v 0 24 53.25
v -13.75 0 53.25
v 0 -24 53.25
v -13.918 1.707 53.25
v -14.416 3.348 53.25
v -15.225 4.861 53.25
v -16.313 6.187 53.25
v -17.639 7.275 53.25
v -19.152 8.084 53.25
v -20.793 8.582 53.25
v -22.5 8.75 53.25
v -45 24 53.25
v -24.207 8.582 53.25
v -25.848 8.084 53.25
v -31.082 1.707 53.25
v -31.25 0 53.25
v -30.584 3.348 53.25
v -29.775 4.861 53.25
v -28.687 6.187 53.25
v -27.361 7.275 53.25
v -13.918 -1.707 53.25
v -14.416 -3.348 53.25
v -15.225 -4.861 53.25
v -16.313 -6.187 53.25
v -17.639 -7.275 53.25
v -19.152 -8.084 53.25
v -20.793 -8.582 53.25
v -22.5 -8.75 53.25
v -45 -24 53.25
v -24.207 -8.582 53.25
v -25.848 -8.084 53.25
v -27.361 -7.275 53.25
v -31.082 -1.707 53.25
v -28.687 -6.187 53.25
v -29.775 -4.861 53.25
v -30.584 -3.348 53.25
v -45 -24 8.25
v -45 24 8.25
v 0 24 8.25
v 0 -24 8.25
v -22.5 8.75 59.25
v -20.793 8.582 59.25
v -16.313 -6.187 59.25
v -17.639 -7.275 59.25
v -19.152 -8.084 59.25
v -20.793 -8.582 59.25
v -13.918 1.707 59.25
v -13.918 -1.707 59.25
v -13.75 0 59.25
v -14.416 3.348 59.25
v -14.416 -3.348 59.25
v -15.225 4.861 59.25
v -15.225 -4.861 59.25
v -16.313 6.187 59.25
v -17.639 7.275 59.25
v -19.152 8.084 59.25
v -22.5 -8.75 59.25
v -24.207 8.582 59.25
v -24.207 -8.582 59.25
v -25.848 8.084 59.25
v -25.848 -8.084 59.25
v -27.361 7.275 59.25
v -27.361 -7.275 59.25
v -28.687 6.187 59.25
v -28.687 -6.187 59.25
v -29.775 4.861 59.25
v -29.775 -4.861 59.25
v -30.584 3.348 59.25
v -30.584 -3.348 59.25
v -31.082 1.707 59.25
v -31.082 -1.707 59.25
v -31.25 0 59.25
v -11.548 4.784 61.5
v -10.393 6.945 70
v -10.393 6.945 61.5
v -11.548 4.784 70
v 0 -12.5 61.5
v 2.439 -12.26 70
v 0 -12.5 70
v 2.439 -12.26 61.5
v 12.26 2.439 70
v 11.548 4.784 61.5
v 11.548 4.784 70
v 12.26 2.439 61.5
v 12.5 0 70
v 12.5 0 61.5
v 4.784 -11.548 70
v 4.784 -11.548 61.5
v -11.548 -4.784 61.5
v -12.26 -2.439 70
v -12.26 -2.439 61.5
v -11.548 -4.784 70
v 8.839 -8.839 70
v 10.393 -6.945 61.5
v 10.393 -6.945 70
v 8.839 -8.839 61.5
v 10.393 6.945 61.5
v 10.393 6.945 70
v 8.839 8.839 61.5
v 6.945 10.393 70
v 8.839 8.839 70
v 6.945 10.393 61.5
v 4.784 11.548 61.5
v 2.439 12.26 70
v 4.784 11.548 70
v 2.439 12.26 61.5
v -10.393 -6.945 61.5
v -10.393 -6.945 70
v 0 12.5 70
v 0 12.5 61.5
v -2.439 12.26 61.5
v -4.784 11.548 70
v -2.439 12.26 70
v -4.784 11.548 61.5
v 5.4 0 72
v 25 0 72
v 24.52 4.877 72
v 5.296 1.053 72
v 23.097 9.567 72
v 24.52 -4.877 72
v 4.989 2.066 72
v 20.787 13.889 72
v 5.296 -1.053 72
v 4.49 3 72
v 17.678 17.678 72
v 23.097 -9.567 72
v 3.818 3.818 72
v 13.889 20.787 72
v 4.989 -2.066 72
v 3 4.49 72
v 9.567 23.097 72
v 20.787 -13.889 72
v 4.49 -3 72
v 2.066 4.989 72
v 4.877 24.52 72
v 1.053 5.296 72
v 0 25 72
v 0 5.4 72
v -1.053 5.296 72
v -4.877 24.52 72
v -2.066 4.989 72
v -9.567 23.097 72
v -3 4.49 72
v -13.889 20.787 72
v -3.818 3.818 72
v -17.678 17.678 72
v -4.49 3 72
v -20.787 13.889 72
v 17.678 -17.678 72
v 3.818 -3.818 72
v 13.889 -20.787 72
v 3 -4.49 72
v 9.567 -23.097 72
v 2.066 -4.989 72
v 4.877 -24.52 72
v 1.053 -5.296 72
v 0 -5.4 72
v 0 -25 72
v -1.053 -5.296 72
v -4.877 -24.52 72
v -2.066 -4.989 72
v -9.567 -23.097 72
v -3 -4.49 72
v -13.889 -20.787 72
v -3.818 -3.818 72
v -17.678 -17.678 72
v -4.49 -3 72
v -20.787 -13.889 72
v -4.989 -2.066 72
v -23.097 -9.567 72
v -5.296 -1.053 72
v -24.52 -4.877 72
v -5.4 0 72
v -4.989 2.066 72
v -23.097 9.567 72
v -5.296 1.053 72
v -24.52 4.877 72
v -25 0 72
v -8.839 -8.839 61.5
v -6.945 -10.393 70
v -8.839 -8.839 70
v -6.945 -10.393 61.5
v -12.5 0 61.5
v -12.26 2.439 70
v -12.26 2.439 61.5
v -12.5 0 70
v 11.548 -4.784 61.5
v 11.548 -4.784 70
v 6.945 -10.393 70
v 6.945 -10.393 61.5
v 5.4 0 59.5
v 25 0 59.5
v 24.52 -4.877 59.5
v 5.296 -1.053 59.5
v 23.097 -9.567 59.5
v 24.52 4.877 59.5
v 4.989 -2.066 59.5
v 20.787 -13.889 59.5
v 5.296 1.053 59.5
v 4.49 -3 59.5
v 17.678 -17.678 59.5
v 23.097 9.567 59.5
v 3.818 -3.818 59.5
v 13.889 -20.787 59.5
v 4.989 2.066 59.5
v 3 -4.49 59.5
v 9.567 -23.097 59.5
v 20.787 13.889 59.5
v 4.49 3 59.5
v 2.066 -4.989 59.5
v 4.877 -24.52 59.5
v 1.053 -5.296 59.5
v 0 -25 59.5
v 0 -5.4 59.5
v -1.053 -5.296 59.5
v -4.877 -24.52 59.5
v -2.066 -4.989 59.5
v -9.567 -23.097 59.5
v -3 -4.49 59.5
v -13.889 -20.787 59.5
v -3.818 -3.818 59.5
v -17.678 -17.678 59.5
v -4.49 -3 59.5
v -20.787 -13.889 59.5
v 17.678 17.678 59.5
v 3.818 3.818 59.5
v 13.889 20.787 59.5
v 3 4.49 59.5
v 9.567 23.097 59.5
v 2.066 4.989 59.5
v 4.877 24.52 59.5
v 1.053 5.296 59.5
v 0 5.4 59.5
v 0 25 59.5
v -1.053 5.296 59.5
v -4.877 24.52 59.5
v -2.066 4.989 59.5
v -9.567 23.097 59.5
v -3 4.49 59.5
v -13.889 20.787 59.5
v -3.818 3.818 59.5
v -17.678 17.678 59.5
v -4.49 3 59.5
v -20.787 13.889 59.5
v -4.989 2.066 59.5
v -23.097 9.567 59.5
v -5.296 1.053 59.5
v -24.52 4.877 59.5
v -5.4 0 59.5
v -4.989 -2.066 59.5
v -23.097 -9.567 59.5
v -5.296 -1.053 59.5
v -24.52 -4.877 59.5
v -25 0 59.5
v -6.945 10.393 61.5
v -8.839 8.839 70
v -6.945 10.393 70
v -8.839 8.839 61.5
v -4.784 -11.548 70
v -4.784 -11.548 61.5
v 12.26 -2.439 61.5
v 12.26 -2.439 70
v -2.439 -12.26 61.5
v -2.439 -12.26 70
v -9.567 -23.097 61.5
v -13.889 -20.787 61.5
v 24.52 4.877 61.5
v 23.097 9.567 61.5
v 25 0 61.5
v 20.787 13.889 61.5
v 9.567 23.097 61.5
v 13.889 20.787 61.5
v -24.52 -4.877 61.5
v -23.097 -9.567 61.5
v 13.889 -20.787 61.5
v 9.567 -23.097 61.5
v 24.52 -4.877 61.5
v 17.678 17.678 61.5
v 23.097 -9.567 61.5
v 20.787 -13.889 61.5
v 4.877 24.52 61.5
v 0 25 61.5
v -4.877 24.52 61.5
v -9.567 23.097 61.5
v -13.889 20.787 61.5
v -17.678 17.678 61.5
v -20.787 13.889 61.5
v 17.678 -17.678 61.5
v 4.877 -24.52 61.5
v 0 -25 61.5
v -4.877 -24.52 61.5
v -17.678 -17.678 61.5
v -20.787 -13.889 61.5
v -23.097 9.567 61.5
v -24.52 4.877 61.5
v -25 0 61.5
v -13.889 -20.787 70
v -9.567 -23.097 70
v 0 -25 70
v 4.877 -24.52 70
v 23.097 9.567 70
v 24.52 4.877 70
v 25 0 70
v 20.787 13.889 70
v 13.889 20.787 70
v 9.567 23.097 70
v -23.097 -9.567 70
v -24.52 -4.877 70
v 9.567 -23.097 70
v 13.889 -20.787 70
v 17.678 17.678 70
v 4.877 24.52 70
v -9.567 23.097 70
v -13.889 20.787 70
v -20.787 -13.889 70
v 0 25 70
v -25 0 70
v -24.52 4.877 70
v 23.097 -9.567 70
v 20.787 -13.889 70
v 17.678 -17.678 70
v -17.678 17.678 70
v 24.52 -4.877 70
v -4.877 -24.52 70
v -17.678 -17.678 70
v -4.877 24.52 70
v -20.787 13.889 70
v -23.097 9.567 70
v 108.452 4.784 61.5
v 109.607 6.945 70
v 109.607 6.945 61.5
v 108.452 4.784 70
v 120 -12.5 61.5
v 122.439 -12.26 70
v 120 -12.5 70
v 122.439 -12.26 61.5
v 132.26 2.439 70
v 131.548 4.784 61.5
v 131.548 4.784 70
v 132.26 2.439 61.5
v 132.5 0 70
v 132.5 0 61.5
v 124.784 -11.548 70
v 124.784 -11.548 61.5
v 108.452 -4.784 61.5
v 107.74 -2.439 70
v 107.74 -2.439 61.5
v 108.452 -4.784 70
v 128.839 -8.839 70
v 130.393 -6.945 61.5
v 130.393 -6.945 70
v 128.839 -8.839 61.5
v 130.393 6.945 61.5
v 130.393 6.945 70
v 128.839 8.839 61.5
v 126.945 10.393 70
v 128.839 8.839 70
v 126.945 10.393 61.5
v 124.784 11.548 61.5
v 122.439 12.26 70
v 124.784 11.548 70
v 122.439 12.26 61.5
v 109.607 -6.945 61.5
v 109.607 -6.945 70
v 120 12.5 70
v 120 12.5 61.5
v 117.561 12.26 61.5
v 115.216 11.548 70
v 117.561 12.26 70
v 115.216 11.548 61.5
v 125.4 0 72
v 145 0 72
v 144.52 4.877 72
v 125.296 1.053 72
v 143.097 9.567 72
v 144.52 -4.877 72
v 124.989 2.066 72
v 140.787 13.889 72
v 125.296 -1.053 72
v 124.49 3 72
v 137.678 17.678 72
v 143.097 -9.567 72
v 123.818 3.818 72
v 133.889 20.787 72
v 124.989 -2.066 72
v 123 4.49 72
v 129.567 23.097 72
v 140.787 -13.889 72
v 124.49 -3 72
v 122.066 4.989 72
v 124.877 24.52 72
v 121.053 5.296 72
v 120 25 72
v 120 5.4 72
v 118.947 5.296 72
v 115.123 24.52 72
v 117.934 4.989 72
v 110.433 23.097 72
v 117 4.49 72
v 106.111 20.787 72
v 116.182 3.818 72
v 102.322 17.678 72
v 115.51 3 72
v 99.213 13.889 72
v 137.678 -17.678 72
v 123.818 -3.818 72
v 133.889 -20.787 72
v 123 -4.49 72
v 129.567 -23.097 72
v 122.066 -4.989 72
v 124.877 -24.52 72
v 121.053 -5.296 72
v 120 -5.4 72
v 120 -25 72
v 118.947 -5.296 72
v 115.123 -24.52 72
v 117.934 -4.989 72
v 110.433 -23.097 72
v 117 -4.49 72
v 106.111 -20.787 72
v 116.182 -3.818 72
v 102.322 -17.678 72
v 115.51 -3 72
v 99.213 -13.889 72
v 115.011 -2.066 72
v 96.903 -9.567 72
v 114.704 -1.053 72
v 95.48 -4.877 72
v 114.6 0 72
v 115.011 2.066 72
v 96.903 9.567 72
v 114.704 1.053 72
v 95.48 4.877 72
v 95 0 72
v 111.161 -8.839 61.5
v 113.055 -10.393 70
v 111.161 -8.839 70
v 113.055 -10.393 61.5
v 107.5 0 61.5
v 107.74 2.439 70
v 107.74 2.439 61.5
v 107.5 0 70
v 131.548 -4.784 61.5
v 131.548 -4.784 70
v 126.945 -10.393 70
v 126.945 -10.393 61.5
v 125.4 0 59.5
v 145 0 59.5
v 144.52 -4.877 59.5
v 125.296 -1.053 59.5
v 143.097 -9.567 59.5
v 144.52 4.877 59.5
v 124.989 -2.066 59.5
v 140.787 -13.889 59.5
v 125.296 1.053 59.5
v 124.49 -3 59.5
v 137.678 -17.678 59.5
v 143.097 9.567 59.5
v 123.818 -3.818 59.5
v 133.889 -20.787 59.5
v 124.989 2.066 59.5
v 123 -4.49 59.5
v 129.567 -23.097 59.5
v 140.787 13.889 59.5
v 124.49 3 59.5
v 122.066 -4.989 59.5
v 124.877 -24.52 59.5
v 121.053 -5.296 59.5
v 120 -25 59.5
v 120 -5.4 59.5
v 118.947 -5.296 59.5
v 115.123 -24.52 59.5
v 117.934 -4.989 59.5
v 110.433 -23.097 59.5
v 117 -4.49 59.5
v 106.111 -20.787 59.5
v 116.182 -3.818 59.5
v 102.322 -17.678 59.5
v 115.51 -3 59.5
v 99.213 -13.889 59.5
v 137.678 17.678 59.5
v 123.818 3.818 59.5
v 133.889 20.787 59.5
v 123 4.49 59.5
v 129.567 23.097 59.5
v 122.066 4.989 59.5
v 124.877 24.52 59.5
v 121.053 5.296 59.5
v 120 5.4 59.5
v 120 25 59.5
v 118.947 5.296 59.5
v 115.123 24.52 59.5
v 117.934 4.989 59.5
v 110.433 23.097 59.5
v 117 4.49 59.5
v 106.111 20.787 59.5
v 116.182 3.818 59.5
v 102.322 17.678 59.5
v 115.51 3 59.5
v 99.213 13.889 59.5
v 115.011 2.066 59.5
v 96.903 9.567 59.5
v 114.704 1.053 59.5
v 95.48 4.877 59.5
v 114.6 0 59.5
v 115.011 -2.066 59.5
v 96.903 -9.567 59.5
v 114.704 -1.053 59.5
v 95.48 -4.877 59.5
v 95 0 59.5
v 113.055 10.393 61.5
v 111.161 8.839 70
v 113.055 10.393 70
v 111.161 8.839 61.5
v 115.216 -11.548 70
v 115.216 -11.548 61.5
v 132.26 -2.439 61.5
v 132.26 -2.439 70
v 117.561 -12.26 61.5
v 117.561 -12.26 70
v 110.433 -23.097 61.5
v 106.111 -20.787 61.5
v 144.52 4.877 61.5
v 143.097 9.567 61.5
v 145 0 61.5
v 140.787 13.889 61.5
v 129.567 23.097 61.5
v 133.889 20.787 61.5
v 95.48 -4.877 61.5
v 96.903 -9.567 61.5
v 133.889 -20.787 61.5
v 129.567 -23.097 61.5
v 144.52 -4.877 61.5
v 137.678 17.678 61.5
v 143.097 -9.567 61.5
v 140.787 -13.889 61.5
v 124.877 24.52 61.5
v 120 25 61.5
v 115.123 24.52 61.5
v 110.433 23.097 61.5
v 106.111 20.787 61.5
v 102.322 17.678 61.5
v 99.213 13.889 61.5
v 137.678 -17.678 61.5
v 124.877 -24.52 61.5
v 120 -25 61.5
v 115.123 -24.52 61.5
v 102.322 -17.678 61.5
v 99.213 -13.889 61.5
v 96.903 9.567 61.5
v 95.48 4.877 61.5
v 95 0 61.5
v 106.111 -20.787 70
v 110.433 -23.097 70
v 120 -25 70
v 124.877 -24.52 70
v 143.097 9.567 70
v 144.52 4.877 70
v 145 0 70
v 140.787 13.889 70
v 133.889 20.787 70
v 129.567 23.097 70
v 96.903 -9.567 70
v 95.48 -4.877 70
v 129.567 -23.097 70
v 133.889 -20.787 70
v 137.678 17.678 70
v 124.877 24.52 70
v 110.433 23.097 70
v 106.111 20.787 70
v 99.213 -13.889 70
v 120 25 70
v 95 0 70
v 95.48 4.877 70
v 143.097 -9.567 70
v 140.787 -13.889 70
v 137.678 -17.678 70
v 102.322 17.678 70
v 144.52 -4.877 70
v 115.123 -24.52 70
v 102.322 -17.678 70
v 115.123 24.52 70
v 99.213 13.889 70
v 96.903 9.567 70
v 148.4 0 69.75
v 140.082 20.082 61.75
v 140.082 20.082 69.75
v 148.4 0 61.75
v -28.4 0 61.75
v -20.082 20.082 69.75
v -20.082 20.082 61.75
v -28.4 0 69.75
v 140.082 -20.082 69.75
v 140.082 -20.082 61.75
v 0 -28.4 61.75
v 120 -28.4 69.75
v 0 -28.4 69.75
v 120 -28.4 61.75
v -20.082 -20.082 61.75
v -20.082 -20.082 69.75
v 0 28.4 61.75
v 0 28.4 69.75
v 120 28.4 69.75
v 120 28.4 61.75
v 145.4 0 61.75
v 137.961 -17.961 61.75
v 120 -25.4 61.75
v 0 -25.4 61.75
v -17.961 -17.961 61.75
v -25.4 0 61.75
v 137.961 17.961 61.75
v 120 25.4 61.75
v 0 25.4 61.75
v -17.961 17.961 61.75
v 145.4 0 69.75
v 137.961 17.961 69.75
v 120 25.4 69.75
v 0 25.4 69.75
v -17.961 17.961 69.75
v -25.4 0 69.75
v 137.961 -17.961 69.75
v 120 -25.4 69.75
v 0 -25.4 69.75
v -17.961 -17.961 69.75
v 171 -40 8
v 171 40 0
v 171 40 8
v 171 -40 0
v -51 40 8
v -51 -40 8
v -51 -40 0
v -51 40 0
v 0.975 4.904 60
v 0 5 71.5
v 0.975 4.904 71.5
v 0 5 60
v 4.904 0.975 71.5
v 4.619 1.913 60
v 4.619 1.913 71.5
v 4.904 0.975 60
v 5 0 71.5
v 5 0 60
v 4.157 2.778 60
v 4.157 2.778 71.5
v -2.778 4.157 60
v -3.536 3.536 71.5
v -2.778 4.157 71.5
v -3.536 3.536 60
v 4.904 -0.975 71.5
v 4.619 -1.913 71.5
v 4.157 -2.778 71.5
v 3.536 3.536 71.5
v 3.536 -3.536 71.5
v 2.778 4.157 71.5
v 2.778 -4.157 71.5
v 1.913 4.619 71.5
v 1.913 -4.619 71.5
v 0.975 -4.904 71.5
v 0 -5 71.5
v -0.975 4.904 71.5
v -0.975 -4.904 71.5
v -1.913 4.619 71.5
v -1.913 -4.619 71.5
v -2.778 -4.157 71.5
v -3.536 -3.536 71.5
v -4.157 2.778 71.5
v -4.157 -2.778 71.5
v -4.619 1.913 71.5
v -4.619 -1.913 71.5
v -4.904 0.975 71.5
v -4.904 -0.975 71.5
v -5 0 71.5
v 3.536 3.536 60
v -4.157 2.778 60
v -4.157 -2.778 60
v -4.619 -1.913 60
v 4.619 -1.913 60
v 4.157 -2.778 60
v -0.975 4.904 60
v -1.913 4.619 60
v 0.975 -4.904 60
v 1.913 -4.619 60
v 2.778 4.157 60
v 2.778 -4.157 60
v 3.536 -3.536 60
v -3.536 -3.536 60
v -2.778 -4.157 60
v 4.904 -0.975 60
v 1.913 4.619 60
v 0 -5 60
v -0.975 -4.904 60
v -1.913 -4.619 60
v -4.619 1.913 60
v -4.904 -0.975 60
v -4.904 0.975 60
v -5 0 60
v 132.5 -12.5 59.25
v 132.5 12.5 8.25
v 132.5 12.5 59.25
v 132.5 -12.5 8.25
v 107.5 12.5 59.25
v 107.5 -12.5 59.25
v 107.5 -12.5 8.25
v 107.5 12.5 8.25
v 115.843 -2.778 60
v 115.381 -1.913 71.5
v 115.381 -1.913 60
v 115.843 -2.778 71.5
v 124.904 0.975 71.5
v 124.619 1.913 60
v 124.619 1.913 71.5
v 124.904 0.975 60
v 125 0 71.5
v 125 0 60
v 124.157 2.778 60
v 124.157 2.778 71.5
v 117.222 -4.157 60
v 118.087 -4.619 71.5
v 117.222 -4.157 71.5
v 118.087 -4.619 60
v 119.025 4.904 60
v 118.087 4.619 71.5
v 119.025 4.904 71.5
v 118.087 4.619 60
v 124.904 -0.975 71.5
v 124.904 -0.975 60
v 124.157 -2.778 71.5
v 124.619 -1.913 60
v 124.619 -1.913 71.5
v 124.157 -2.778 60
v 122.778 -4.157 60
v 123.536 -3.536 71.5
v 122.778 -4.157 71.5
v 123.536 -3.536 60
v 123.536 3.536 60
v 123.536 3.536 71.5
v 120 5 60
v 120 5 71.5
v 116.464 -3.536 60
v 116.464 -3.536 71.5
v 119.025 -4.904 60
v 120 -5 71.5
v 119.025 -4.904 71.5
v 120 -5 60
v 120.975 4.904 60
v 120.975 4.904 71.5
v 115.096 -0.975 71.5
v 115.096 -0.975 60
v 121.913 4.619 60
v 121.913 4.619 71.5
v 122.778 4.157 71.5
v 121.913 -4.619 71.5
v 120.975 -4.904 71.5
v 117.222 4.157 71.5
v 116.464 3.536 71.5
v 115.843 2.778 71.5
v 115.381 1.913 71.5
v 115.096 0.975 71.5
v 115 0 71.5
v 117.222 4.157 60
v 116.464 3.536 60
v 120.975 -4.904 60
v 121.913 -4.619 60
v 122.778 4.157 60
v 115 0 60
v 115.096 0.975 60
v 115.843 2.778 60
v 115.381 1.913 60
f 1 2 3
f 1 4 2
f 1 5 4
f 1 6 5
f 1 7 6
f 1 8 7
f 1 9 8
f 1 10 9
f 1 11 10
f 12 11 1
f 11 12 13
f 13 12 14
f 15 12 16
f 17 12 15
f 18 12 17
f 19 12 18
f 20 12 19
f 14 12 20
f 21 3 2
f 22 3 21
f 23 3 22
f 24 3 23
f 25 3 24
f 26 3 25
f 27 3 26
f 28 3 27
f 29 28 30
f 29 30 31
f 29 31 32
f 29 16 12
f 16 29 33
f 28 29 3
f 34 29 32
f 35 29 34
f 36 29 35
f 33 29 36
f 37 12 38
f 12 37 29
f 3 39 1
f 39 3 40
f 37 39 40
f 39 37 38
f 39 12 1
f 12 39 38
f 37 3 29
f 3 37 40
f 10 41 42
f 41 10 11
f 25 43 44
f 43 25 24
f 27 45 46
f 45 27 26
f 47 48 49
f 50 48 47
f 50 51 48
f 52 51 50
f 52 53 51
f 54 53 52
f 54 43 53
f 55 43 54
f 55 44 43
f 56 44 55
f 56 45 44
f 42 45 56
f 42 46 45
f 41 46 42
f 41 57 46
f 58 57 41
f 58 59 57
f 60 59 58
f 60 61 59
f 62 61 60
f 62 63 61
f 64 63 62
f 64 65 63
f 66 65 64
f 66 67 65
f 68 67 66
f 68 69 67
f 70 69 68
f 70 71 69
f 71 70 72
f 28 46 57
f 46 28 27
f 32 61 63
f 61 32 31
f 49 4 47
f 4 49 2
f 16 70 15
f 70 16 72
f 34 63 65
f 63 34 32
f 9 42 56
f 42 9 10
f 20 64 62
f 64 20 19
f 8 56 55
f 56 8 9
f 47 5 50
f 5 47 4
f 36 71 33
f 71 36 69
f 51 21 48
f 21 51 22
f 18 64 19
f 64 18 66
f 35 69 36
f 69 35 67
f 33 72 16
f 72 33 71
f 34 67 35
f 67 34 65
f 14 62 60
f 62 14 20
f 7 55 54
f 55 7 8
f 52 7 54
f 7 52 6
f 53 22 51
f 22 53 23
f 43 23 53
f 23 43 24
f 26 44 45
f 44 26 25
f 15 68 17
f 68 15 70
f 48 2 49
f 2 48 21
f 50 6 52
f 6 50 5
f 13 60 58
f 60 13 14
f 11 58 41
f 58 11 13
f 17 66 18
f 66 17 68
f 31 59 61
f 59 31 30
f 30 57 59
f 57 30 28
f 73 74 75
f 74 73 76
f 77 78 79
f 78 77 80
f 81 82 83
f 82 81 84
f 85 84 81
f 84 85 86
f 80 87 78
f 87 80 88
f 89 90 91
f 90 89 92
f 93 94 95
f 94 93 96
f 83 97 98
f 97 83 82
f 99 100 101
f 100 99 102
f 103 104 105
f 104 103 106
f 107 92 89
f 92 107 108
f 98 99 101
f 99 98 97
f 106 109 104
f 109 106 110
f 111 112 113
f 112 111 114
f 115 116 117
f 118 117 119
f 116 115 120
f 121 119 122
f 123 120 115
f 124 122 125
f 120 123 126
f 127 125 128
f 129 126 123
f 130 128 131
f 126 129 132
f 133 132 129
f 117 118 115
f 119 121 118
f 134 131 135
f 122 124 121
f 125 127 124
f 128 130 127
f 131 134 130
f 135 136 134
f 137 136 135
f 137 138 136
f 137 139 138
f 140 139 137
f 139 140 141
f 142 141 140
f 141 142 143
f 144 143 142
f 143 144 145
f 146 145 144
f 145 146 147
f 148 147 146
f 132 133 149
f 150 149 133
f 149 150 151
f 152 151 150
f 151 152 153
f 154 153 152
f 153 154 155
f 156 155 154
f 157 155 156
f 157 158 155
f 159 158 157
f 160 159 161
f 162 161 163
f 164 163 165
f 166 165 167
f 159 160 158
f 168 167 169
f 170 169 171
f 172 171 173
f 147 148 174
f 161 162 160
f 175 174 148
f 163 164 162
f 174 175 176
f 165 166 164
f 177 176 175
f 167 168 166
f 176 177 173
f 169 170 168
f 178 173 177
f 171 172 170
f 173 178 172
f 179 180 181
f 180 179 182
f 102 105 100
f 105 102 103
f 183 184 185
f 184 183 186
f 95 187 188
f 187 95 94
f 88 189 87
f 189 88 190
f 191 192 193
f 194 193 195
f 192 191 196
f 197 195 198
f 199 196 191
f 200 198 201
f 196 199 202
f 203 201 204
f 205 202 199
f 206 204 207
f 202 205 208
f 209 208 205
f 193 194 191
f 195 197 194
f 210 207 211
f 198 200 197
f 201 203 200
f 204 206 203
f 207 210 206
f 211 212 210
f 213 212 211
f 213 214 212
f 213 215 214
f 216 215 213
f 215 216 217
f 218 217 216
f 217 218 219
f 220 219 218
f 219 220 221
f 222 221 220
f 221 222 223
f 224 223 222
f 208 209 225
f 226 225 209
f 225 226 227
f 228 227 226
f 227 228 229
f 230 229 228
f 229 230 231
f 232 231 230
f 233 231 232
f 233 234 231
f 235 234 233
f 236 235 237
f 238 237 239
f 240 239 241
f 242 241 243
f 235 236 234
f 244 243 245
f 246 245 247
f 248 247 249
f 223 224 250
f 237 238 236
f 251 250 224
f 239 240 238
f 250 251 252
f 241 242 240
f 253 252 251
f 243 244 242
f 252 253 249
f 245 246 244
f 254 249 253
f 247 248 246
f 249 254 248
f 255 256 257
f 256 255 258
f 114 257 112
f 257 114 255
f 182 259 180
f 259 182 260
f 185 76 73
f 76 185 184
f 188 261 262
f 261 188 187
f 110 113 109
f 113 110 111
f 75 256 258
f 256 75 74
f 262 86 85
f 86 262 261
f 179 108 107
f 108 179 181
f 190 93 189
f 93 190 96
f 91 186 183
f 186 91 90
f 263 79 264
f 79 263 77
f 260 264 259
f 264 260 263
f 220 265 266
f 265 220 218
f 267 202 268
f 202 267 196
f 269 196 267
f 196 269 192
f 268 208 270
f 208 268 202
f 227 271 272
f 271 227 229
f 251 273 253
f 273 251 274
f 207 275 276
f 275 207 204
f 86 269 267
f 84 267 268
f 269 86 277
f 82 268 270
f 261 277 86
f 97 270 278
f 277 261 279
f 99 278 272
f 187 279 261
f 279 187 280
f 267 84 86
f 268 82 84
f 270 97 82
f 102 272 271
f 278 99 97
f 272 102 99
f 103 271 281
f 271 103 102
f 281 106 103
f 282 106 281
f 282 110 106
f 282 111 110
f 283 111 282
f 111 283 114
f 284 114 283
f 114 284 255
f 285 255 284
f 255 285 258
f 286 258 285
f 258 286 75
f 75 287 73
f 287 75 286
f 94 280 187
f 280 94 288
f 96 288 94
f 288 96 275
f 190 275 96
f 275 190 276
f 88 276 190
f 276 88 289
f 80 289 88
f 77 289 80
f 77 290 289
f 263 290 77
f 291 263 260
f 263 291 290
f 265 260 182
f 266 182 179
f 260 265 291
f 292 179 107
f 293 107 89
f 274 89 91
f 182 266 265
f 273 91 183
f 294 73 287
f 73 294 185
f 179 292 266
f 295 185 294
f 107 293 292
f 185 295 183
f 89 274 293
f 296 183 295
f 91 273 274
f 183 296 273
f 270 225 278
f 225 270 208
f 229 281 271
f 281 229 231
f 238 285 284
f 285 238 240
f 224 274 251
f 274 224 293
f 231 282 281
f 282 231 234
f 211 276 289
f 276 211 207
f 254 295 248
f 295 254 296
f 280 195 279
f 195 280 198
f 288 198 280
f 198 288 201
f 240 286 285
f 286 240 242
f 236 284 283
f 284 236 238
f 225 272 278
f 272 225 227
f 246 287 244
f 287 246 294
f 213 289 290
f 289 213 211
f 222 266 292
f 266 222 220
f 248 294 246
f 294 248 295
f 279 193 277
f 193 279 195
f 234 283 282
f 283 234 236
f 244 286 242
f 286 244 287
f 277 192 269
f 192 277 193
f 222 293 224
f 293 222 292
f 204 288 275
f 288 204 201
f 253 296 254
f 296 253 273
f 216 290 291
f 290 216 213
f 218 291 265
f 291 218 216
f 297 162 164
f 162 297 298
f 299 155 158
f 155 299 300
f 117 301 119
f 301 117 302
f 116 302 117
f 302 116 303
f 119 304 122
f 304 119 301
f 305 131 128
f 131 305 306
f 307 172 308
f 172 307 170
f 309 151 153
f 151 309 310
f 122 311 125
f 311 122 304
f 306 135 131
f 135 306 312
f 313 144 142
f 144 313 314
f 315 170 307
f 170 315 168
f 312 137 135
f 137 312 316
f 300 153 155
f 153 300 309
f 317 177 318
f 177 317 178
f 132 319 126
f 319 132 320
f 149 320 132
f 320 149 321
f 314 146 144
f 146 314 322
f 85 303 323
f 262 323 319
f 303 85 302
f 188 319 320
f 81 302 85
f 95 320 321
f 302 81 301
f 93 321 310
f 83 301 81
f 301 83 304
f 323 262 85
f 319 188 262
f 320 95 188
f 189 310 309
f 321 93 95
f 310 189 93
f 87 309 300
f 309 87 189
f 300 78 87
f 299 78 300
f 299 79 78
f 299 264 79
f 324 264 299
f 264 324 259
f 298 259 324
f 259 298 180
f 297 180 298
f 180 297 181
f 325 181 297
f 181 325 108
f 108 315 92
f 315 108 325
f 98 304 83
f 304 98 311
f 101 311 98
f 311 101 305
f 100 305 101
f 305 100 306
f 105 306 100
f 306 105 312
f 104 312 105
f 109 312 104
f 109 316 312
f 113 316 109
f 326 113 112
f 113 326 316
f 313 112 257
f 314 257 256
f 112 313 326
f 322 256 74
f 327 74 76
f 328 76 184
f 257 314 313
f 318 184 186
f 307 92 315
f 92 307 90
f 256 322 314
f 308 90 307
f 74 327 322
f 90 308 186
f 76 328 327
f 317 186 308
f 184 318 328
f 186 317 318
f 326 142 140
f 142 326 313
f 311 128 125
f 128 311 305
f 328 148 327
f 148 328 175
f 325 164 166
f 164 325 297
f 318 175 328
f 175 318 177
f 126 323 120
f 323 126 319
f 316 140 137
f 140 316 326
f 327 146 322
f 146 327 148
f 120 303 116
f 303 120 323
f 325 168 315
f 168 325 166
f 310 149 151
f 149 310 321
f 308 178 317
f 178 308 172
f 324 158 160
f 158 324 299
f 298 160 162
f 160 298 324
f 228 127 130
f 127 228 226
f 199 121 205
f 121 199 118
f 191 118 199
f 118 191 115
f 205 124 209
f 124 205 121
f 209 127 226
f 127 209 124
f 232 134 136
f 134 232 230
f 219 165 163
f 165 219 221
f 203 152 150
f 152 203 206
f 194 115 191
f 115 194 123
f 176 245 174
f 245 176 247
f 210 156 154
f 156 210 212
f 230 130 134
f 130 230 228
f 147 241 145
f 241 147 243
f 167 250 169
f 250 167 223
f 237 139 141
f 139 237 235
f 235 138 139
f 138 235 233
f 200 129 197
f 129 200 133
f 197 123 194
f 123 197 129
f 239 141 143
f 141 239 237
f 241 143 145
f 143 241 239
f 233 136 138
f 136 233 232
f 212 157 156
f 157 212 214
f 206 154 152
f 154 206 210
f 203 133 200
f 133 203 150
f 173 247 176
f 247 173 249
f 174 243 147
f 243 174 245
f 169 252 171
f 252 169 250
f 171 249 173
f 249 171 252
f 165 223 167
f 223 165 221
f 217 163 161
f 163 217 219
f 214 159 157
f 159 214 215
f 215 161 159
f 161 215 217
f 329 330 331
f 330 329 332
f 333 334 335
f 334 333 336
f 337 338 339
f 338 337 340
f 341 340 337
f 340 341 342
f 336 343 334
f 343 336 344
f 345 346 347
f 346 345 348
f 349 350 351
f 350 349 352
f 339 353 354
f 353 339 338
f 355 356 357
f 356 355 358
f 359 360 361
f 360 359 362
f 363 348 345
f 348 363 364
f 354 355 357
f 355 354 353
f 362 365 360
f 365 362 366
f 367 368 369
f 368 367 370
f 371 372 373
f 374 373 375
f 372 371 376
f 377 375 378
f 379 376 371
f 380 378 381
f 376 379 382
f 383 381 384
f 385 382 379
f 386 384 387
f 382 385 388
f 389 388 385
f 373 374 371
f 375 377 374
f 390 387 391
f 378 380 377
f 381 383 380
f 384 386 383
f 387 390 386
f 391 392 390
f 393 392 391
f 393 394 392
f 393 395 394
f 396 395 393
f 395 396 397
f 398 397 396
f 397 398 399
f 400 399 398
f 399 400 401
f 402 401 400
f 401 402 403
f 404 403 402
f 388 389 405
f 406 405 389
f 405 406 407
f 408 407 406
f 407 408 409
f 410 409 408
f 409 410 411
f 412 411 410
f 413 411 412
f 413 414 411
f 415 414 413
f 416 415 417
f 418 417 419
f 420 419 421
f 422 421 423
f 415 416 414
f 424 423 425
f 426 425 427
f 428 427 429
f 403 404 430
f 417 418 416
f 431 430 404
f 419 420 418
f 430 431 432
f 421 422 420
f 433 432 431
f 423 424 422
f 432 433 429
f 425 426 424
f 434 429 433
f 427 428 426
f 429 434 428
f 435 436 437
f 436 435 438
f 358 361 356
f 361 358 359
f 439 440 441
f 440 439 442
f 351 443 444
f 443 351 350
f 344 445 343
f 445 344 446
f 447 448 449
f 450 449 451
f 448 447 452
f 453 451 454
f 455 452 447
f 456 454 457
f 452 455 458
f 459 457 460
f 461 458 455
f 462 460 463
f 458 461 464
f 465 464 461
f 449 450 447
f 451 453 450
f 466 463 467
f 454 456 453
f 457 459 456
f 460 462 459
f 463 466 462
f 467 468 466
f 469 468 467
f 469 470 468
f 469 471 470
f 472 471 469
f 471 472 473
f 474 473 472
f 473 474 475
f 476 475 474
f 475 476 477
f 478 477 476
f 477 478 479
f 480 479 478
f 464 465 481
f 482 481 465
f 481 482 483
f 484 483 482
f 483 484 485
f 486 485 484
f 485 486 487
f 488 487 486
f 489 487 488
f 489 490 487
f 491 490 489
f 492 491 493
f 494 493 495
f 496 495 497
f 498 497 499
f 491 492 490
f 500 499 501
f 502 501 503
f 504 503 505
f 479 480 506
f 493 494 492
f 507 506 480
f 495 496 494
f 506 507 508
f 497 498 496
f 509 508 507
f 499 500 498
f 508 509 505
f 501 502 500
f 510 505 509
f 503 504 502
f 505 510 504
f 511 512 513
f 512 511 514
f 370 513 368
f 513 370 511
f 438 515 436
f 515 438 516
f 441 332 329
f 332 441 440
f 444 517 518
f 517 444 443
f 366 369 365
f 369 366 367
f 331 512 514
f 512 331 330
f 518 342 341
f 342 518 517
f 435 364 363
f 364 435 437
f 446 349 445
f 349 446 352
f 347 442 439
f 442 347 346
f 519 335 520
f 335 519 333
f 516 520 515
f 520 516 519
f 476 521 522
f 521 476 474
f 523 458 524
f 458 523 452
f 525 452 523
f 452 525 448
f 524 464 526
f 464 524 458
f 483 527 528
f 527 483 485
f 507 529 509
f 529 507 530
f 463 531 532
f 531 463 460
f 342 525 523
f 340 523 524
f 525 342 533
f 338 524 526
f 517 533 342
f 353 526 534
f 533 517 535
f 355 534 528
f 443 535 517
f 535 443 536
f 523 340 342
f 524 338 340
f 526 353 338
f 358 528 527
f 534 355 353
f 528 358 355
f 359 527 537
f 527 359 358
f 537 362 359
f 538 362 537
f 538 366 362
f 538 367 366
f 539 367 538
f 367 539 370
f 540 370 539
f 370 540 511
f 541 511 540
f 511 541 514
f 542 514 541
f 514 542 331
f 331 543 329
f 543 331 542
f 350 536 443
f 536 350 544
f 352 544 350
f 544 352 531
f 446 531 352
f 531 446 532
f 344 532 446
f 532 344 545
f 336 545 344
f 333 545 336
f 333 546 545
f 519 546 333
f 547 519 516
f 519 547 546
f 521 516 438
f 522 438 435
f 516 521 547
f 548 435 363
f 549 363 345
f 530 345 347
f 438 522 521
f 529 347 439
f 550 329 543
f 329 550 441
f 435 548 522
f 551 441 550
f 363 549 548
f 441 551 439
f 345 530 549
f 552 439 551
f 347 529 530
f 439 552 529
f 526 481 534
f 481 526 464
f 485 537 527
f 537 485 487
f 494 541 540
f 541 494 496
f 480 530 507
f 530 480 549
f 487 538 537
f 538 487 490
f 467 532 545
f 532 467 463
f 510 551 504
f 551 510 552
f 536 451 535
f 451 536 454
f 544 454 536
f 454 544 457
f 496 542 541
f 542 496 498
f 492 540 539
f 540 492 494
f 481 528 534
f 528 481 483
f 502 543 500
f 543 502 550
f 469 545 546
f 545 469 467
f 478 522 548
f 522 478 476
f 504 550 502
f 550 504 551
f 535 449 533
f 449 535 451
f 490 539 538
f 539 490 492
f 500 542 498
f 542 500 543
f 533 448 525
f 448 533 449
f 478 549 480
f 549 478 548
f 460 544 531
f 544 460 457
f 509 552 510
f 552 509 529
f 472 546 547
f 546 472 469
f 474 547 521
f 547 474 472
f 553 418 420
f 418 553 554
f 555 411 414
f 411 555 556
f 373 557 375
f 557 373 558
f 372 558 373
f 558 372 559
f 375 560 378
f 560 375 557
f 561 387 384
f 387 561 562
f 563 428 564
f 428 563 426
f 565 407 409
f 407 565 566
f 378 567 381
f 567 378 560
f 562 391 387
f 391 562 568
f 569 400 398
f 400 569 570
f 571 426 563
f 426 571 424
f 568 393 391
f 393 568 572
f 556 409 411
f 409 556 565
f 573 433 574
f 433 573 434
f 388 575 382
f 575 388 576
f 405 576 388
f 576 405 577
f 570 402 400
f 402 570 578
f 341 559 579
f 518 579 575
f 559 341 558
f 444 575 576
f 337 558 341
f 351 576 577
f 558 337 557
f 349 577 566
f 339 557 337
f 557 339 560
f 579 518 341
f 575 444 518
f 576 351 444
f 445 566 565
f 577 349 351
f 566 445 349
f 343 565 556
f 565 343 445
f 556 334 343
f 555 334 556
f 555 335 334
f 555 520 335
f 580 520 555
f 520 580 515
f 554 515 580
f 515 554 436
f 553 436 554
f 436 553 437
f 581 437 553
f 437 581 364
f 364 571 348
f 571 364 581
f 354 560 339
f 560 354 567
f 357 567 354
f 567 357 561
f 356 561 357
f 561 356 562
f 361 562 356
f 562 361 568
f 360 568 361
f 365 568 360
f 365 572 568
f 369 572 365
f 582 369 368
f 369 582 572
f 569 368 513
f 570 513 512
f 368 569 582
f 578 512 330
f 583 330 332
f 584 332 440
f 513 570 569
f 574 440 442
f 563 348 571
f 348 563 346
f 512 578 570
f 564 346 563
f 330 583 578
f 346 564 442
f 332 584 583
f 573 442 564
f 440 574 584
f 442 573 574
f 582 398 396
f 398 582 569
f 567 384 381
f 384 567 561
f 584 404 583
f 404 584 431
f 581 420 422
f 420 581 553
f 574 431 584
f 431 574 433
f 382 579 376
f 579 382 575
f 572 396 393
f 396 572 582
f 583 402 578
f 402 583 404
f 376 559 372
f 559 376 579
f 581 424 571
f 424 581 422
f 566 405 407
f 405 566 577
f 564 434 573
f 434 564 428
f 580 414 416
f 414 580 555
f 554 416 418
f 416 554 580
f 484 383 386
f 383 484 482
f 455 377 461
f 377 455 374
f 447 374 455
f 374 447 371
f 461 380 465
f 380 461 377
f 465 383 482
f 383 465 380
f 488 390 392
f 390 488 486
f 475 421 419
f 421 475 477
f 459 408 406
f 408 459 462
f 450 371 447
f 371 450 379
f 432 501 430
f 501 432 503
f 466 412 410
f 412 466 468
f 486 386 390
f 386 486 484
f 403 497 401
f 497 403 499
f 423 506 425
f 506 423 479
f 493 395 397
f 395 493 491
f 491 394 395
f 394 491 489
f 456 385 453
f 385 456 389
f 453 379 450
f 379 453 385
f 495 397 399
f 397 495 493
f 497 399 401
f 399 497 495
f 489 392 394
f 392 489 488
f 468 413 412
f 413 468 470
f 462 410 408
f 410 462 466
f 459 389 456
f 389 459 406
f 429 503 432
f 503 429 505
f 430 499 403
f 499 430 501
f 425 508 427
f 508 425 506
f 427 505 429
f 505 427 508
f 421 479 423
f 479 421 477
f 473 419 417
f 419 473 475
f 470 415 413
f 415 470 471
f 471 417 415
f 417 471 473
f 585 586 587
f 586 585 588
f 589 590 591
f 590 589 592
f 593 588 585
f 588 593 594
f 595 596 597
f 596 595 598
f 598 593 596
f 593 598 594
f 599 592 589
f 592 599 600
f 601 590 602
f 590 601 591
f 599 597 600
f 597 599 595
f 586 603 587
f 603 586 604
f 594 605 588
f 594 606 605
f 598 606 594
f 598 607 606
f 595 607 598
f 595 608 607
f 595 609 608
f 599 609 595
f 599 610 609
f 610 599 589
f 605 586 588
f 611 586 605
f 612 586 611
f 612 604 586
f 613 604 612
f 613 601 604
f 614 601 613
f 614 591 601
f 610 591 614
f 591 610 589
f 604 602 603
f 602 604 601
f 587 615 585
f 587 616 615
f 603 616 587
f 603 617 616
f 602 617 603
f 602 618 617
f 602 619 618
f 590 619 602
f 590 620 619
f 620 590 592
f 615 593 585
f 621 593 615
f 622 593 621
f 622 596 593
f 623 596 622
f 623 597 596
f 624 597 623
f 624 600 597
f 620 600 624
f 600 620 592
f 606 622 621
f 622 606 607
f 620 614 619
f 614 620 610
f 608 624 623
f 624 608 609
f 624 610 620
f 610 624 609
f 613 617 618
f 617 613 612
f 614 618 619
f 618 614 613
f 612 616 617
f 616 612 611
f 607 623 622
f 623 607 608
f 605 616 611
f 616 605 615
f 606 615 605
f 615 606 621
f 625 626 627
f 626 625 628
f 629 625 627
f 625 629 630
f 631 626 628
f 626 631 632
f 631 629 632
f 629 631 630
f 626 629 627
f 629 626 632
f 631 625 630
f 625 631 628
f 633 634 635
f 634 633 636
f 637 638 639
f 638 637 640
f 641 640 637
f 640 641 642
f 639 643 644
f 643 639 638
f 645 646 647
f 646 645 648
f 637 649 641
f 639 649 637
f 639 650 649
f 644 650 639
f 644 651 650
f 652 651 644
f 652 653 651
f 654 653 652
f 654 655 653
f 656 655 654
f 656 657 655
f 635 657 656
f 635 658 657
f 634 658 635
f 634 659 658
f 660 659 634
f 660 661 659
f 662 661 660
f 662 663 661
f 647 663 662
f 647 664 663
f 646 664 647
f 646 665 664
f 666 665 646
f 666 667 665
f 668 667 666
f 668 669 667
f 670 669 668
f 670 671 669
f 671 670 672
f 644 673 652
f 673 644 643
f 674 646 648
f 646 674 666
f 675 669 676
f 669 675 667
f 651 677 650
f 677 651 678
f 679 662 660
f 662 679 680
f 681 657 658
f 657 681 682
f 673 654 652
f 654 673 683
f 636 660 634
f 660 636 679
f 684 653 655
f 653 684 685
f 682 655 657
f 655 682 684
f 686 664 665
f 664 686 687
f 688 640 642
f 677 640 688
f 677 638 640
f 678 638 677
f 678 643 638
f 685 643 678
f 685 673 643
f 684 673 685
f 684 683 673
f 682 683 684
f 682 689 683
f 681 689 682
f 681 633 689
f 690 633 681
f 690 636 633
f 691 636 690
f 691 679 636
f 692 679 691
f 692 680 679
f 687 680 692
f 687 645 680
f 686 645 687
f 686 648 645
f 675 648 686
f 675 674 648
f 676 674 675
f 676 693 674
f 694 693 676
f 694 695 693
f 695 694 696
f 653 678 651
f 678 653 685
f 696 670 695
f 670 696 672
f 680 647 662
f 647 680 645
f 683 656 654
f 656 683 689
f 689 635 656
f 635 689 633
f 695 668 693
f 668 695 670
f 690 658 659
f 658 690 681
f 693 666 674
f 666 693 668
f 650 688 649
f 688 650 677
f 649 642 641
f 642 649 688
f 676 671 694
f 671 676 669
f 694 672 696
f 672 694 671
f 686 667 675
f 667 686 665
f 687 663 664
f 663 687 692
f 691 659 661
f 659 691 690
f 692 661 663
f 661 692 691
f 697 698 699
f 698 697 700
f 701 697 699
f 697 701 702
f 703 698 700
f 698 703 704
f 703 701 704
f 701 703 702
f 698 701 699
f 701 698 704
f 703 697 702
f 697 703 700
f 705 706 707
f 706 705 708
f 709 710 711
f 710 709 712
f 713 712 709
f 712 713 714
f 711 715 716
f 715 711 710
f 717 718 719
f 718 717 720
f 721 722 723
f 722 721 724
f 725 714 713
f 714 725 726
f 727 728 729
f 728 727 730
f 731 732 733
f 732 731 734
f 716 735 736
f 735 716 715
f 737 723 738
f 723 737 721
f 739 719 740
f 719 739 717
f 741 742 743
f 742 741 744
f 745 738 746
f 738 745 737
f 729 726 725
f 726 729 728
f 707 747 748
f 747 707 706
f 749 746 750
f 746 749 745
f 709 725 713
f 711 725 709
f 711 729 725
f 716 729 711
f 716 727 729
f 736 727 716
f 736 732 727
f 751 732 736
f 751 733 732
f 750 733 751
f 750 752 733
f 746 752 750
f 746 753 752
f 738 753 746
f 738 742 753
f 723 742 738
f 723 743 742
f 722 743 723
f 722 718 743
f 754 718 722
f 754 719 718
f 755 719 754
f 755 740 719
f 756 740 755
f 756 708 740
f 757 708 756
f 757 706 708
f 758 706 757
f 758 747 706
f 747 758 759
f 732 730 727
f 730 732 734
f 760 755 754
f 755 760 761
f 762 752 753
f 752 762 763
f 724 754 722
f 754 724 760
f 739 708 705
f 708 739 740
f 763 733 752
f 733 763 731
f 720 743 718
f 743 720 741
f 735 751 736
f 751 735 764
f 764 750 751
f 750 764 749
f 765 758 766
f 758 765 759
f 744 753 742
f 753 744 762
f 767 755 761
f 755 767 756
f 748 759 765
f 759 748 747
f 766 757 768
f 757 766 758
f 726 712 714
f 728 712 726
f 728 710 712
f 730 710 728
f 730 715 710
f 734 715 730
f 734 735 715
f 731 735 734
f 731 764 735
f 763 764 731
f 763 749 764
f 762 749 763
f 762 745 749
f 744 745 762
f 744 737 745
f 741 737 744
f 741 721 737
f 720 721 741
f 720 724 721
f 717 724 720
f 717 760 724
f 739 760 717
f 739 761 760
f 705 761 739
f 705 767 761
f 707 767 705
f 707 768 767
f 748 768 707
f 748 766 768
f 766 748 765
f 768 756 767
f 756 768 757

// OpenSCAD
$fn = 32;

// ------------------------------------------------------------------------
// Motor belt drive: span 120 mm, pulleys d50, belt 8 mm wide
// Every part is its own module, assembly() places every instance.
// ------------------------------------------------------------------------

// --- part 1 ---
module base_plate() {
  difference() {
    translate([-111, -40, 0]) cube([222, 80, 8]);
  }
}

// --- part 2 ---
module motor() {
  union() {
    translate([-22.5, -24, 0]) cube([45, 48, 45]);
    translate([25.5, 0, 22.5]) rotate([0, 90, 0]) cylinder(h = 6, d = 17.5, center = true);
  }
}

// --- part 3 ---
module drive_shaft() {
  translate([0, 0, -5.75]) cylinder(h = 11.5, d = 10);
}

// --- part 4 ---
module pulley_drive() {
  difference() {
    union() {
      cylinder(h = 12.5, d = 25);
      cylinder(h = 2, d = 50);
      translate([0, 0, 10.5]) cylinder(h = 2, d = 50);
    }
    translate([0, 0, -1]) cylinder(h = 14.5, d = 10.8);
  }
}

// --- part 5 ---
module idler_post() {
  translate([-12.5, -12.5, 0]) cube([25, 25, 51]);
}

// --- part 6 ---
module driven_shaft() {
  translate([0, 0, -5.75]) cylinder(h = 11.5, d = 10);
}

// --- part 7 ---
module pulley_driven() {
  difference() {
    union() {
      cylinder(h = 12.5, d = 25);
      cylinder(h = 2, d = 50);
      translate([0, 0, 10.5]) cylinder(h = 2, d = 50);
    }
    translate([0, 0, -1]) cylinder(h = 14.5, d = 10.8);
  }
}

// --- part 8 ---
module drive_belt() {
  difference() {
    linear_extrude(height = 8) polygon(points = concat([for (a = [90 : 45 : 270]) [28.4 * cos(a), 28.4 * sin(a)]], [for (a = [270 : 45 : 450]) [120 + 28.4 * cos(a), 28.4 * sin(a)]]));
    translate([0, 0, -1]) linear_extrude(height = 10) polygon(points = concat([for (a = [90 : 45 : 270]) [25.4 * cos(a), 25.4 * sin(a)]], [for (a = [270 : 45 : 450]) [120 + 25.4 * cos(a), 25.4 * sin(a)]]));
  }
}

// --- assembly ---
module assembly() {
  color([0.80, 0.24, 0.20]) translate([60, 0, 0]) rotate([0, 0, 0]) base_plate();
  color([0.20, 0.45, 0.75]) translate([0, 0, 30.75]) rotate([0, 270, 0]) motor();
  color([0.25, 0.62, 0.32]) translate([0, 0, 65.75]) rotate([0, 0, 0]) drive_shaft();
  color([0.92, 0.70, 0.18]) translate([0, 0, 59.5]) rotate([0, 0, 0]) pulley_drive();
  color([0.58, 0.35, 0.70]) translate([120, 0, 8.25]) rotate([0, 0, 0]) idler_post();
  color([0.16, 0.66, 0.66]) translate([120, 0, 65.75]) rotate([0, 0, 0]) driven_shaft();
  color([0.85, 0.48, 0.18]) translate([120, 0, 59.5]) rotate([0, 0, 0]) pulley_driven();
  color([0.55, 0.60, 0.65]) translate([0, 0, 61.75]) rotate([0, 0, 0]) drive_belt();
}

assembly();
